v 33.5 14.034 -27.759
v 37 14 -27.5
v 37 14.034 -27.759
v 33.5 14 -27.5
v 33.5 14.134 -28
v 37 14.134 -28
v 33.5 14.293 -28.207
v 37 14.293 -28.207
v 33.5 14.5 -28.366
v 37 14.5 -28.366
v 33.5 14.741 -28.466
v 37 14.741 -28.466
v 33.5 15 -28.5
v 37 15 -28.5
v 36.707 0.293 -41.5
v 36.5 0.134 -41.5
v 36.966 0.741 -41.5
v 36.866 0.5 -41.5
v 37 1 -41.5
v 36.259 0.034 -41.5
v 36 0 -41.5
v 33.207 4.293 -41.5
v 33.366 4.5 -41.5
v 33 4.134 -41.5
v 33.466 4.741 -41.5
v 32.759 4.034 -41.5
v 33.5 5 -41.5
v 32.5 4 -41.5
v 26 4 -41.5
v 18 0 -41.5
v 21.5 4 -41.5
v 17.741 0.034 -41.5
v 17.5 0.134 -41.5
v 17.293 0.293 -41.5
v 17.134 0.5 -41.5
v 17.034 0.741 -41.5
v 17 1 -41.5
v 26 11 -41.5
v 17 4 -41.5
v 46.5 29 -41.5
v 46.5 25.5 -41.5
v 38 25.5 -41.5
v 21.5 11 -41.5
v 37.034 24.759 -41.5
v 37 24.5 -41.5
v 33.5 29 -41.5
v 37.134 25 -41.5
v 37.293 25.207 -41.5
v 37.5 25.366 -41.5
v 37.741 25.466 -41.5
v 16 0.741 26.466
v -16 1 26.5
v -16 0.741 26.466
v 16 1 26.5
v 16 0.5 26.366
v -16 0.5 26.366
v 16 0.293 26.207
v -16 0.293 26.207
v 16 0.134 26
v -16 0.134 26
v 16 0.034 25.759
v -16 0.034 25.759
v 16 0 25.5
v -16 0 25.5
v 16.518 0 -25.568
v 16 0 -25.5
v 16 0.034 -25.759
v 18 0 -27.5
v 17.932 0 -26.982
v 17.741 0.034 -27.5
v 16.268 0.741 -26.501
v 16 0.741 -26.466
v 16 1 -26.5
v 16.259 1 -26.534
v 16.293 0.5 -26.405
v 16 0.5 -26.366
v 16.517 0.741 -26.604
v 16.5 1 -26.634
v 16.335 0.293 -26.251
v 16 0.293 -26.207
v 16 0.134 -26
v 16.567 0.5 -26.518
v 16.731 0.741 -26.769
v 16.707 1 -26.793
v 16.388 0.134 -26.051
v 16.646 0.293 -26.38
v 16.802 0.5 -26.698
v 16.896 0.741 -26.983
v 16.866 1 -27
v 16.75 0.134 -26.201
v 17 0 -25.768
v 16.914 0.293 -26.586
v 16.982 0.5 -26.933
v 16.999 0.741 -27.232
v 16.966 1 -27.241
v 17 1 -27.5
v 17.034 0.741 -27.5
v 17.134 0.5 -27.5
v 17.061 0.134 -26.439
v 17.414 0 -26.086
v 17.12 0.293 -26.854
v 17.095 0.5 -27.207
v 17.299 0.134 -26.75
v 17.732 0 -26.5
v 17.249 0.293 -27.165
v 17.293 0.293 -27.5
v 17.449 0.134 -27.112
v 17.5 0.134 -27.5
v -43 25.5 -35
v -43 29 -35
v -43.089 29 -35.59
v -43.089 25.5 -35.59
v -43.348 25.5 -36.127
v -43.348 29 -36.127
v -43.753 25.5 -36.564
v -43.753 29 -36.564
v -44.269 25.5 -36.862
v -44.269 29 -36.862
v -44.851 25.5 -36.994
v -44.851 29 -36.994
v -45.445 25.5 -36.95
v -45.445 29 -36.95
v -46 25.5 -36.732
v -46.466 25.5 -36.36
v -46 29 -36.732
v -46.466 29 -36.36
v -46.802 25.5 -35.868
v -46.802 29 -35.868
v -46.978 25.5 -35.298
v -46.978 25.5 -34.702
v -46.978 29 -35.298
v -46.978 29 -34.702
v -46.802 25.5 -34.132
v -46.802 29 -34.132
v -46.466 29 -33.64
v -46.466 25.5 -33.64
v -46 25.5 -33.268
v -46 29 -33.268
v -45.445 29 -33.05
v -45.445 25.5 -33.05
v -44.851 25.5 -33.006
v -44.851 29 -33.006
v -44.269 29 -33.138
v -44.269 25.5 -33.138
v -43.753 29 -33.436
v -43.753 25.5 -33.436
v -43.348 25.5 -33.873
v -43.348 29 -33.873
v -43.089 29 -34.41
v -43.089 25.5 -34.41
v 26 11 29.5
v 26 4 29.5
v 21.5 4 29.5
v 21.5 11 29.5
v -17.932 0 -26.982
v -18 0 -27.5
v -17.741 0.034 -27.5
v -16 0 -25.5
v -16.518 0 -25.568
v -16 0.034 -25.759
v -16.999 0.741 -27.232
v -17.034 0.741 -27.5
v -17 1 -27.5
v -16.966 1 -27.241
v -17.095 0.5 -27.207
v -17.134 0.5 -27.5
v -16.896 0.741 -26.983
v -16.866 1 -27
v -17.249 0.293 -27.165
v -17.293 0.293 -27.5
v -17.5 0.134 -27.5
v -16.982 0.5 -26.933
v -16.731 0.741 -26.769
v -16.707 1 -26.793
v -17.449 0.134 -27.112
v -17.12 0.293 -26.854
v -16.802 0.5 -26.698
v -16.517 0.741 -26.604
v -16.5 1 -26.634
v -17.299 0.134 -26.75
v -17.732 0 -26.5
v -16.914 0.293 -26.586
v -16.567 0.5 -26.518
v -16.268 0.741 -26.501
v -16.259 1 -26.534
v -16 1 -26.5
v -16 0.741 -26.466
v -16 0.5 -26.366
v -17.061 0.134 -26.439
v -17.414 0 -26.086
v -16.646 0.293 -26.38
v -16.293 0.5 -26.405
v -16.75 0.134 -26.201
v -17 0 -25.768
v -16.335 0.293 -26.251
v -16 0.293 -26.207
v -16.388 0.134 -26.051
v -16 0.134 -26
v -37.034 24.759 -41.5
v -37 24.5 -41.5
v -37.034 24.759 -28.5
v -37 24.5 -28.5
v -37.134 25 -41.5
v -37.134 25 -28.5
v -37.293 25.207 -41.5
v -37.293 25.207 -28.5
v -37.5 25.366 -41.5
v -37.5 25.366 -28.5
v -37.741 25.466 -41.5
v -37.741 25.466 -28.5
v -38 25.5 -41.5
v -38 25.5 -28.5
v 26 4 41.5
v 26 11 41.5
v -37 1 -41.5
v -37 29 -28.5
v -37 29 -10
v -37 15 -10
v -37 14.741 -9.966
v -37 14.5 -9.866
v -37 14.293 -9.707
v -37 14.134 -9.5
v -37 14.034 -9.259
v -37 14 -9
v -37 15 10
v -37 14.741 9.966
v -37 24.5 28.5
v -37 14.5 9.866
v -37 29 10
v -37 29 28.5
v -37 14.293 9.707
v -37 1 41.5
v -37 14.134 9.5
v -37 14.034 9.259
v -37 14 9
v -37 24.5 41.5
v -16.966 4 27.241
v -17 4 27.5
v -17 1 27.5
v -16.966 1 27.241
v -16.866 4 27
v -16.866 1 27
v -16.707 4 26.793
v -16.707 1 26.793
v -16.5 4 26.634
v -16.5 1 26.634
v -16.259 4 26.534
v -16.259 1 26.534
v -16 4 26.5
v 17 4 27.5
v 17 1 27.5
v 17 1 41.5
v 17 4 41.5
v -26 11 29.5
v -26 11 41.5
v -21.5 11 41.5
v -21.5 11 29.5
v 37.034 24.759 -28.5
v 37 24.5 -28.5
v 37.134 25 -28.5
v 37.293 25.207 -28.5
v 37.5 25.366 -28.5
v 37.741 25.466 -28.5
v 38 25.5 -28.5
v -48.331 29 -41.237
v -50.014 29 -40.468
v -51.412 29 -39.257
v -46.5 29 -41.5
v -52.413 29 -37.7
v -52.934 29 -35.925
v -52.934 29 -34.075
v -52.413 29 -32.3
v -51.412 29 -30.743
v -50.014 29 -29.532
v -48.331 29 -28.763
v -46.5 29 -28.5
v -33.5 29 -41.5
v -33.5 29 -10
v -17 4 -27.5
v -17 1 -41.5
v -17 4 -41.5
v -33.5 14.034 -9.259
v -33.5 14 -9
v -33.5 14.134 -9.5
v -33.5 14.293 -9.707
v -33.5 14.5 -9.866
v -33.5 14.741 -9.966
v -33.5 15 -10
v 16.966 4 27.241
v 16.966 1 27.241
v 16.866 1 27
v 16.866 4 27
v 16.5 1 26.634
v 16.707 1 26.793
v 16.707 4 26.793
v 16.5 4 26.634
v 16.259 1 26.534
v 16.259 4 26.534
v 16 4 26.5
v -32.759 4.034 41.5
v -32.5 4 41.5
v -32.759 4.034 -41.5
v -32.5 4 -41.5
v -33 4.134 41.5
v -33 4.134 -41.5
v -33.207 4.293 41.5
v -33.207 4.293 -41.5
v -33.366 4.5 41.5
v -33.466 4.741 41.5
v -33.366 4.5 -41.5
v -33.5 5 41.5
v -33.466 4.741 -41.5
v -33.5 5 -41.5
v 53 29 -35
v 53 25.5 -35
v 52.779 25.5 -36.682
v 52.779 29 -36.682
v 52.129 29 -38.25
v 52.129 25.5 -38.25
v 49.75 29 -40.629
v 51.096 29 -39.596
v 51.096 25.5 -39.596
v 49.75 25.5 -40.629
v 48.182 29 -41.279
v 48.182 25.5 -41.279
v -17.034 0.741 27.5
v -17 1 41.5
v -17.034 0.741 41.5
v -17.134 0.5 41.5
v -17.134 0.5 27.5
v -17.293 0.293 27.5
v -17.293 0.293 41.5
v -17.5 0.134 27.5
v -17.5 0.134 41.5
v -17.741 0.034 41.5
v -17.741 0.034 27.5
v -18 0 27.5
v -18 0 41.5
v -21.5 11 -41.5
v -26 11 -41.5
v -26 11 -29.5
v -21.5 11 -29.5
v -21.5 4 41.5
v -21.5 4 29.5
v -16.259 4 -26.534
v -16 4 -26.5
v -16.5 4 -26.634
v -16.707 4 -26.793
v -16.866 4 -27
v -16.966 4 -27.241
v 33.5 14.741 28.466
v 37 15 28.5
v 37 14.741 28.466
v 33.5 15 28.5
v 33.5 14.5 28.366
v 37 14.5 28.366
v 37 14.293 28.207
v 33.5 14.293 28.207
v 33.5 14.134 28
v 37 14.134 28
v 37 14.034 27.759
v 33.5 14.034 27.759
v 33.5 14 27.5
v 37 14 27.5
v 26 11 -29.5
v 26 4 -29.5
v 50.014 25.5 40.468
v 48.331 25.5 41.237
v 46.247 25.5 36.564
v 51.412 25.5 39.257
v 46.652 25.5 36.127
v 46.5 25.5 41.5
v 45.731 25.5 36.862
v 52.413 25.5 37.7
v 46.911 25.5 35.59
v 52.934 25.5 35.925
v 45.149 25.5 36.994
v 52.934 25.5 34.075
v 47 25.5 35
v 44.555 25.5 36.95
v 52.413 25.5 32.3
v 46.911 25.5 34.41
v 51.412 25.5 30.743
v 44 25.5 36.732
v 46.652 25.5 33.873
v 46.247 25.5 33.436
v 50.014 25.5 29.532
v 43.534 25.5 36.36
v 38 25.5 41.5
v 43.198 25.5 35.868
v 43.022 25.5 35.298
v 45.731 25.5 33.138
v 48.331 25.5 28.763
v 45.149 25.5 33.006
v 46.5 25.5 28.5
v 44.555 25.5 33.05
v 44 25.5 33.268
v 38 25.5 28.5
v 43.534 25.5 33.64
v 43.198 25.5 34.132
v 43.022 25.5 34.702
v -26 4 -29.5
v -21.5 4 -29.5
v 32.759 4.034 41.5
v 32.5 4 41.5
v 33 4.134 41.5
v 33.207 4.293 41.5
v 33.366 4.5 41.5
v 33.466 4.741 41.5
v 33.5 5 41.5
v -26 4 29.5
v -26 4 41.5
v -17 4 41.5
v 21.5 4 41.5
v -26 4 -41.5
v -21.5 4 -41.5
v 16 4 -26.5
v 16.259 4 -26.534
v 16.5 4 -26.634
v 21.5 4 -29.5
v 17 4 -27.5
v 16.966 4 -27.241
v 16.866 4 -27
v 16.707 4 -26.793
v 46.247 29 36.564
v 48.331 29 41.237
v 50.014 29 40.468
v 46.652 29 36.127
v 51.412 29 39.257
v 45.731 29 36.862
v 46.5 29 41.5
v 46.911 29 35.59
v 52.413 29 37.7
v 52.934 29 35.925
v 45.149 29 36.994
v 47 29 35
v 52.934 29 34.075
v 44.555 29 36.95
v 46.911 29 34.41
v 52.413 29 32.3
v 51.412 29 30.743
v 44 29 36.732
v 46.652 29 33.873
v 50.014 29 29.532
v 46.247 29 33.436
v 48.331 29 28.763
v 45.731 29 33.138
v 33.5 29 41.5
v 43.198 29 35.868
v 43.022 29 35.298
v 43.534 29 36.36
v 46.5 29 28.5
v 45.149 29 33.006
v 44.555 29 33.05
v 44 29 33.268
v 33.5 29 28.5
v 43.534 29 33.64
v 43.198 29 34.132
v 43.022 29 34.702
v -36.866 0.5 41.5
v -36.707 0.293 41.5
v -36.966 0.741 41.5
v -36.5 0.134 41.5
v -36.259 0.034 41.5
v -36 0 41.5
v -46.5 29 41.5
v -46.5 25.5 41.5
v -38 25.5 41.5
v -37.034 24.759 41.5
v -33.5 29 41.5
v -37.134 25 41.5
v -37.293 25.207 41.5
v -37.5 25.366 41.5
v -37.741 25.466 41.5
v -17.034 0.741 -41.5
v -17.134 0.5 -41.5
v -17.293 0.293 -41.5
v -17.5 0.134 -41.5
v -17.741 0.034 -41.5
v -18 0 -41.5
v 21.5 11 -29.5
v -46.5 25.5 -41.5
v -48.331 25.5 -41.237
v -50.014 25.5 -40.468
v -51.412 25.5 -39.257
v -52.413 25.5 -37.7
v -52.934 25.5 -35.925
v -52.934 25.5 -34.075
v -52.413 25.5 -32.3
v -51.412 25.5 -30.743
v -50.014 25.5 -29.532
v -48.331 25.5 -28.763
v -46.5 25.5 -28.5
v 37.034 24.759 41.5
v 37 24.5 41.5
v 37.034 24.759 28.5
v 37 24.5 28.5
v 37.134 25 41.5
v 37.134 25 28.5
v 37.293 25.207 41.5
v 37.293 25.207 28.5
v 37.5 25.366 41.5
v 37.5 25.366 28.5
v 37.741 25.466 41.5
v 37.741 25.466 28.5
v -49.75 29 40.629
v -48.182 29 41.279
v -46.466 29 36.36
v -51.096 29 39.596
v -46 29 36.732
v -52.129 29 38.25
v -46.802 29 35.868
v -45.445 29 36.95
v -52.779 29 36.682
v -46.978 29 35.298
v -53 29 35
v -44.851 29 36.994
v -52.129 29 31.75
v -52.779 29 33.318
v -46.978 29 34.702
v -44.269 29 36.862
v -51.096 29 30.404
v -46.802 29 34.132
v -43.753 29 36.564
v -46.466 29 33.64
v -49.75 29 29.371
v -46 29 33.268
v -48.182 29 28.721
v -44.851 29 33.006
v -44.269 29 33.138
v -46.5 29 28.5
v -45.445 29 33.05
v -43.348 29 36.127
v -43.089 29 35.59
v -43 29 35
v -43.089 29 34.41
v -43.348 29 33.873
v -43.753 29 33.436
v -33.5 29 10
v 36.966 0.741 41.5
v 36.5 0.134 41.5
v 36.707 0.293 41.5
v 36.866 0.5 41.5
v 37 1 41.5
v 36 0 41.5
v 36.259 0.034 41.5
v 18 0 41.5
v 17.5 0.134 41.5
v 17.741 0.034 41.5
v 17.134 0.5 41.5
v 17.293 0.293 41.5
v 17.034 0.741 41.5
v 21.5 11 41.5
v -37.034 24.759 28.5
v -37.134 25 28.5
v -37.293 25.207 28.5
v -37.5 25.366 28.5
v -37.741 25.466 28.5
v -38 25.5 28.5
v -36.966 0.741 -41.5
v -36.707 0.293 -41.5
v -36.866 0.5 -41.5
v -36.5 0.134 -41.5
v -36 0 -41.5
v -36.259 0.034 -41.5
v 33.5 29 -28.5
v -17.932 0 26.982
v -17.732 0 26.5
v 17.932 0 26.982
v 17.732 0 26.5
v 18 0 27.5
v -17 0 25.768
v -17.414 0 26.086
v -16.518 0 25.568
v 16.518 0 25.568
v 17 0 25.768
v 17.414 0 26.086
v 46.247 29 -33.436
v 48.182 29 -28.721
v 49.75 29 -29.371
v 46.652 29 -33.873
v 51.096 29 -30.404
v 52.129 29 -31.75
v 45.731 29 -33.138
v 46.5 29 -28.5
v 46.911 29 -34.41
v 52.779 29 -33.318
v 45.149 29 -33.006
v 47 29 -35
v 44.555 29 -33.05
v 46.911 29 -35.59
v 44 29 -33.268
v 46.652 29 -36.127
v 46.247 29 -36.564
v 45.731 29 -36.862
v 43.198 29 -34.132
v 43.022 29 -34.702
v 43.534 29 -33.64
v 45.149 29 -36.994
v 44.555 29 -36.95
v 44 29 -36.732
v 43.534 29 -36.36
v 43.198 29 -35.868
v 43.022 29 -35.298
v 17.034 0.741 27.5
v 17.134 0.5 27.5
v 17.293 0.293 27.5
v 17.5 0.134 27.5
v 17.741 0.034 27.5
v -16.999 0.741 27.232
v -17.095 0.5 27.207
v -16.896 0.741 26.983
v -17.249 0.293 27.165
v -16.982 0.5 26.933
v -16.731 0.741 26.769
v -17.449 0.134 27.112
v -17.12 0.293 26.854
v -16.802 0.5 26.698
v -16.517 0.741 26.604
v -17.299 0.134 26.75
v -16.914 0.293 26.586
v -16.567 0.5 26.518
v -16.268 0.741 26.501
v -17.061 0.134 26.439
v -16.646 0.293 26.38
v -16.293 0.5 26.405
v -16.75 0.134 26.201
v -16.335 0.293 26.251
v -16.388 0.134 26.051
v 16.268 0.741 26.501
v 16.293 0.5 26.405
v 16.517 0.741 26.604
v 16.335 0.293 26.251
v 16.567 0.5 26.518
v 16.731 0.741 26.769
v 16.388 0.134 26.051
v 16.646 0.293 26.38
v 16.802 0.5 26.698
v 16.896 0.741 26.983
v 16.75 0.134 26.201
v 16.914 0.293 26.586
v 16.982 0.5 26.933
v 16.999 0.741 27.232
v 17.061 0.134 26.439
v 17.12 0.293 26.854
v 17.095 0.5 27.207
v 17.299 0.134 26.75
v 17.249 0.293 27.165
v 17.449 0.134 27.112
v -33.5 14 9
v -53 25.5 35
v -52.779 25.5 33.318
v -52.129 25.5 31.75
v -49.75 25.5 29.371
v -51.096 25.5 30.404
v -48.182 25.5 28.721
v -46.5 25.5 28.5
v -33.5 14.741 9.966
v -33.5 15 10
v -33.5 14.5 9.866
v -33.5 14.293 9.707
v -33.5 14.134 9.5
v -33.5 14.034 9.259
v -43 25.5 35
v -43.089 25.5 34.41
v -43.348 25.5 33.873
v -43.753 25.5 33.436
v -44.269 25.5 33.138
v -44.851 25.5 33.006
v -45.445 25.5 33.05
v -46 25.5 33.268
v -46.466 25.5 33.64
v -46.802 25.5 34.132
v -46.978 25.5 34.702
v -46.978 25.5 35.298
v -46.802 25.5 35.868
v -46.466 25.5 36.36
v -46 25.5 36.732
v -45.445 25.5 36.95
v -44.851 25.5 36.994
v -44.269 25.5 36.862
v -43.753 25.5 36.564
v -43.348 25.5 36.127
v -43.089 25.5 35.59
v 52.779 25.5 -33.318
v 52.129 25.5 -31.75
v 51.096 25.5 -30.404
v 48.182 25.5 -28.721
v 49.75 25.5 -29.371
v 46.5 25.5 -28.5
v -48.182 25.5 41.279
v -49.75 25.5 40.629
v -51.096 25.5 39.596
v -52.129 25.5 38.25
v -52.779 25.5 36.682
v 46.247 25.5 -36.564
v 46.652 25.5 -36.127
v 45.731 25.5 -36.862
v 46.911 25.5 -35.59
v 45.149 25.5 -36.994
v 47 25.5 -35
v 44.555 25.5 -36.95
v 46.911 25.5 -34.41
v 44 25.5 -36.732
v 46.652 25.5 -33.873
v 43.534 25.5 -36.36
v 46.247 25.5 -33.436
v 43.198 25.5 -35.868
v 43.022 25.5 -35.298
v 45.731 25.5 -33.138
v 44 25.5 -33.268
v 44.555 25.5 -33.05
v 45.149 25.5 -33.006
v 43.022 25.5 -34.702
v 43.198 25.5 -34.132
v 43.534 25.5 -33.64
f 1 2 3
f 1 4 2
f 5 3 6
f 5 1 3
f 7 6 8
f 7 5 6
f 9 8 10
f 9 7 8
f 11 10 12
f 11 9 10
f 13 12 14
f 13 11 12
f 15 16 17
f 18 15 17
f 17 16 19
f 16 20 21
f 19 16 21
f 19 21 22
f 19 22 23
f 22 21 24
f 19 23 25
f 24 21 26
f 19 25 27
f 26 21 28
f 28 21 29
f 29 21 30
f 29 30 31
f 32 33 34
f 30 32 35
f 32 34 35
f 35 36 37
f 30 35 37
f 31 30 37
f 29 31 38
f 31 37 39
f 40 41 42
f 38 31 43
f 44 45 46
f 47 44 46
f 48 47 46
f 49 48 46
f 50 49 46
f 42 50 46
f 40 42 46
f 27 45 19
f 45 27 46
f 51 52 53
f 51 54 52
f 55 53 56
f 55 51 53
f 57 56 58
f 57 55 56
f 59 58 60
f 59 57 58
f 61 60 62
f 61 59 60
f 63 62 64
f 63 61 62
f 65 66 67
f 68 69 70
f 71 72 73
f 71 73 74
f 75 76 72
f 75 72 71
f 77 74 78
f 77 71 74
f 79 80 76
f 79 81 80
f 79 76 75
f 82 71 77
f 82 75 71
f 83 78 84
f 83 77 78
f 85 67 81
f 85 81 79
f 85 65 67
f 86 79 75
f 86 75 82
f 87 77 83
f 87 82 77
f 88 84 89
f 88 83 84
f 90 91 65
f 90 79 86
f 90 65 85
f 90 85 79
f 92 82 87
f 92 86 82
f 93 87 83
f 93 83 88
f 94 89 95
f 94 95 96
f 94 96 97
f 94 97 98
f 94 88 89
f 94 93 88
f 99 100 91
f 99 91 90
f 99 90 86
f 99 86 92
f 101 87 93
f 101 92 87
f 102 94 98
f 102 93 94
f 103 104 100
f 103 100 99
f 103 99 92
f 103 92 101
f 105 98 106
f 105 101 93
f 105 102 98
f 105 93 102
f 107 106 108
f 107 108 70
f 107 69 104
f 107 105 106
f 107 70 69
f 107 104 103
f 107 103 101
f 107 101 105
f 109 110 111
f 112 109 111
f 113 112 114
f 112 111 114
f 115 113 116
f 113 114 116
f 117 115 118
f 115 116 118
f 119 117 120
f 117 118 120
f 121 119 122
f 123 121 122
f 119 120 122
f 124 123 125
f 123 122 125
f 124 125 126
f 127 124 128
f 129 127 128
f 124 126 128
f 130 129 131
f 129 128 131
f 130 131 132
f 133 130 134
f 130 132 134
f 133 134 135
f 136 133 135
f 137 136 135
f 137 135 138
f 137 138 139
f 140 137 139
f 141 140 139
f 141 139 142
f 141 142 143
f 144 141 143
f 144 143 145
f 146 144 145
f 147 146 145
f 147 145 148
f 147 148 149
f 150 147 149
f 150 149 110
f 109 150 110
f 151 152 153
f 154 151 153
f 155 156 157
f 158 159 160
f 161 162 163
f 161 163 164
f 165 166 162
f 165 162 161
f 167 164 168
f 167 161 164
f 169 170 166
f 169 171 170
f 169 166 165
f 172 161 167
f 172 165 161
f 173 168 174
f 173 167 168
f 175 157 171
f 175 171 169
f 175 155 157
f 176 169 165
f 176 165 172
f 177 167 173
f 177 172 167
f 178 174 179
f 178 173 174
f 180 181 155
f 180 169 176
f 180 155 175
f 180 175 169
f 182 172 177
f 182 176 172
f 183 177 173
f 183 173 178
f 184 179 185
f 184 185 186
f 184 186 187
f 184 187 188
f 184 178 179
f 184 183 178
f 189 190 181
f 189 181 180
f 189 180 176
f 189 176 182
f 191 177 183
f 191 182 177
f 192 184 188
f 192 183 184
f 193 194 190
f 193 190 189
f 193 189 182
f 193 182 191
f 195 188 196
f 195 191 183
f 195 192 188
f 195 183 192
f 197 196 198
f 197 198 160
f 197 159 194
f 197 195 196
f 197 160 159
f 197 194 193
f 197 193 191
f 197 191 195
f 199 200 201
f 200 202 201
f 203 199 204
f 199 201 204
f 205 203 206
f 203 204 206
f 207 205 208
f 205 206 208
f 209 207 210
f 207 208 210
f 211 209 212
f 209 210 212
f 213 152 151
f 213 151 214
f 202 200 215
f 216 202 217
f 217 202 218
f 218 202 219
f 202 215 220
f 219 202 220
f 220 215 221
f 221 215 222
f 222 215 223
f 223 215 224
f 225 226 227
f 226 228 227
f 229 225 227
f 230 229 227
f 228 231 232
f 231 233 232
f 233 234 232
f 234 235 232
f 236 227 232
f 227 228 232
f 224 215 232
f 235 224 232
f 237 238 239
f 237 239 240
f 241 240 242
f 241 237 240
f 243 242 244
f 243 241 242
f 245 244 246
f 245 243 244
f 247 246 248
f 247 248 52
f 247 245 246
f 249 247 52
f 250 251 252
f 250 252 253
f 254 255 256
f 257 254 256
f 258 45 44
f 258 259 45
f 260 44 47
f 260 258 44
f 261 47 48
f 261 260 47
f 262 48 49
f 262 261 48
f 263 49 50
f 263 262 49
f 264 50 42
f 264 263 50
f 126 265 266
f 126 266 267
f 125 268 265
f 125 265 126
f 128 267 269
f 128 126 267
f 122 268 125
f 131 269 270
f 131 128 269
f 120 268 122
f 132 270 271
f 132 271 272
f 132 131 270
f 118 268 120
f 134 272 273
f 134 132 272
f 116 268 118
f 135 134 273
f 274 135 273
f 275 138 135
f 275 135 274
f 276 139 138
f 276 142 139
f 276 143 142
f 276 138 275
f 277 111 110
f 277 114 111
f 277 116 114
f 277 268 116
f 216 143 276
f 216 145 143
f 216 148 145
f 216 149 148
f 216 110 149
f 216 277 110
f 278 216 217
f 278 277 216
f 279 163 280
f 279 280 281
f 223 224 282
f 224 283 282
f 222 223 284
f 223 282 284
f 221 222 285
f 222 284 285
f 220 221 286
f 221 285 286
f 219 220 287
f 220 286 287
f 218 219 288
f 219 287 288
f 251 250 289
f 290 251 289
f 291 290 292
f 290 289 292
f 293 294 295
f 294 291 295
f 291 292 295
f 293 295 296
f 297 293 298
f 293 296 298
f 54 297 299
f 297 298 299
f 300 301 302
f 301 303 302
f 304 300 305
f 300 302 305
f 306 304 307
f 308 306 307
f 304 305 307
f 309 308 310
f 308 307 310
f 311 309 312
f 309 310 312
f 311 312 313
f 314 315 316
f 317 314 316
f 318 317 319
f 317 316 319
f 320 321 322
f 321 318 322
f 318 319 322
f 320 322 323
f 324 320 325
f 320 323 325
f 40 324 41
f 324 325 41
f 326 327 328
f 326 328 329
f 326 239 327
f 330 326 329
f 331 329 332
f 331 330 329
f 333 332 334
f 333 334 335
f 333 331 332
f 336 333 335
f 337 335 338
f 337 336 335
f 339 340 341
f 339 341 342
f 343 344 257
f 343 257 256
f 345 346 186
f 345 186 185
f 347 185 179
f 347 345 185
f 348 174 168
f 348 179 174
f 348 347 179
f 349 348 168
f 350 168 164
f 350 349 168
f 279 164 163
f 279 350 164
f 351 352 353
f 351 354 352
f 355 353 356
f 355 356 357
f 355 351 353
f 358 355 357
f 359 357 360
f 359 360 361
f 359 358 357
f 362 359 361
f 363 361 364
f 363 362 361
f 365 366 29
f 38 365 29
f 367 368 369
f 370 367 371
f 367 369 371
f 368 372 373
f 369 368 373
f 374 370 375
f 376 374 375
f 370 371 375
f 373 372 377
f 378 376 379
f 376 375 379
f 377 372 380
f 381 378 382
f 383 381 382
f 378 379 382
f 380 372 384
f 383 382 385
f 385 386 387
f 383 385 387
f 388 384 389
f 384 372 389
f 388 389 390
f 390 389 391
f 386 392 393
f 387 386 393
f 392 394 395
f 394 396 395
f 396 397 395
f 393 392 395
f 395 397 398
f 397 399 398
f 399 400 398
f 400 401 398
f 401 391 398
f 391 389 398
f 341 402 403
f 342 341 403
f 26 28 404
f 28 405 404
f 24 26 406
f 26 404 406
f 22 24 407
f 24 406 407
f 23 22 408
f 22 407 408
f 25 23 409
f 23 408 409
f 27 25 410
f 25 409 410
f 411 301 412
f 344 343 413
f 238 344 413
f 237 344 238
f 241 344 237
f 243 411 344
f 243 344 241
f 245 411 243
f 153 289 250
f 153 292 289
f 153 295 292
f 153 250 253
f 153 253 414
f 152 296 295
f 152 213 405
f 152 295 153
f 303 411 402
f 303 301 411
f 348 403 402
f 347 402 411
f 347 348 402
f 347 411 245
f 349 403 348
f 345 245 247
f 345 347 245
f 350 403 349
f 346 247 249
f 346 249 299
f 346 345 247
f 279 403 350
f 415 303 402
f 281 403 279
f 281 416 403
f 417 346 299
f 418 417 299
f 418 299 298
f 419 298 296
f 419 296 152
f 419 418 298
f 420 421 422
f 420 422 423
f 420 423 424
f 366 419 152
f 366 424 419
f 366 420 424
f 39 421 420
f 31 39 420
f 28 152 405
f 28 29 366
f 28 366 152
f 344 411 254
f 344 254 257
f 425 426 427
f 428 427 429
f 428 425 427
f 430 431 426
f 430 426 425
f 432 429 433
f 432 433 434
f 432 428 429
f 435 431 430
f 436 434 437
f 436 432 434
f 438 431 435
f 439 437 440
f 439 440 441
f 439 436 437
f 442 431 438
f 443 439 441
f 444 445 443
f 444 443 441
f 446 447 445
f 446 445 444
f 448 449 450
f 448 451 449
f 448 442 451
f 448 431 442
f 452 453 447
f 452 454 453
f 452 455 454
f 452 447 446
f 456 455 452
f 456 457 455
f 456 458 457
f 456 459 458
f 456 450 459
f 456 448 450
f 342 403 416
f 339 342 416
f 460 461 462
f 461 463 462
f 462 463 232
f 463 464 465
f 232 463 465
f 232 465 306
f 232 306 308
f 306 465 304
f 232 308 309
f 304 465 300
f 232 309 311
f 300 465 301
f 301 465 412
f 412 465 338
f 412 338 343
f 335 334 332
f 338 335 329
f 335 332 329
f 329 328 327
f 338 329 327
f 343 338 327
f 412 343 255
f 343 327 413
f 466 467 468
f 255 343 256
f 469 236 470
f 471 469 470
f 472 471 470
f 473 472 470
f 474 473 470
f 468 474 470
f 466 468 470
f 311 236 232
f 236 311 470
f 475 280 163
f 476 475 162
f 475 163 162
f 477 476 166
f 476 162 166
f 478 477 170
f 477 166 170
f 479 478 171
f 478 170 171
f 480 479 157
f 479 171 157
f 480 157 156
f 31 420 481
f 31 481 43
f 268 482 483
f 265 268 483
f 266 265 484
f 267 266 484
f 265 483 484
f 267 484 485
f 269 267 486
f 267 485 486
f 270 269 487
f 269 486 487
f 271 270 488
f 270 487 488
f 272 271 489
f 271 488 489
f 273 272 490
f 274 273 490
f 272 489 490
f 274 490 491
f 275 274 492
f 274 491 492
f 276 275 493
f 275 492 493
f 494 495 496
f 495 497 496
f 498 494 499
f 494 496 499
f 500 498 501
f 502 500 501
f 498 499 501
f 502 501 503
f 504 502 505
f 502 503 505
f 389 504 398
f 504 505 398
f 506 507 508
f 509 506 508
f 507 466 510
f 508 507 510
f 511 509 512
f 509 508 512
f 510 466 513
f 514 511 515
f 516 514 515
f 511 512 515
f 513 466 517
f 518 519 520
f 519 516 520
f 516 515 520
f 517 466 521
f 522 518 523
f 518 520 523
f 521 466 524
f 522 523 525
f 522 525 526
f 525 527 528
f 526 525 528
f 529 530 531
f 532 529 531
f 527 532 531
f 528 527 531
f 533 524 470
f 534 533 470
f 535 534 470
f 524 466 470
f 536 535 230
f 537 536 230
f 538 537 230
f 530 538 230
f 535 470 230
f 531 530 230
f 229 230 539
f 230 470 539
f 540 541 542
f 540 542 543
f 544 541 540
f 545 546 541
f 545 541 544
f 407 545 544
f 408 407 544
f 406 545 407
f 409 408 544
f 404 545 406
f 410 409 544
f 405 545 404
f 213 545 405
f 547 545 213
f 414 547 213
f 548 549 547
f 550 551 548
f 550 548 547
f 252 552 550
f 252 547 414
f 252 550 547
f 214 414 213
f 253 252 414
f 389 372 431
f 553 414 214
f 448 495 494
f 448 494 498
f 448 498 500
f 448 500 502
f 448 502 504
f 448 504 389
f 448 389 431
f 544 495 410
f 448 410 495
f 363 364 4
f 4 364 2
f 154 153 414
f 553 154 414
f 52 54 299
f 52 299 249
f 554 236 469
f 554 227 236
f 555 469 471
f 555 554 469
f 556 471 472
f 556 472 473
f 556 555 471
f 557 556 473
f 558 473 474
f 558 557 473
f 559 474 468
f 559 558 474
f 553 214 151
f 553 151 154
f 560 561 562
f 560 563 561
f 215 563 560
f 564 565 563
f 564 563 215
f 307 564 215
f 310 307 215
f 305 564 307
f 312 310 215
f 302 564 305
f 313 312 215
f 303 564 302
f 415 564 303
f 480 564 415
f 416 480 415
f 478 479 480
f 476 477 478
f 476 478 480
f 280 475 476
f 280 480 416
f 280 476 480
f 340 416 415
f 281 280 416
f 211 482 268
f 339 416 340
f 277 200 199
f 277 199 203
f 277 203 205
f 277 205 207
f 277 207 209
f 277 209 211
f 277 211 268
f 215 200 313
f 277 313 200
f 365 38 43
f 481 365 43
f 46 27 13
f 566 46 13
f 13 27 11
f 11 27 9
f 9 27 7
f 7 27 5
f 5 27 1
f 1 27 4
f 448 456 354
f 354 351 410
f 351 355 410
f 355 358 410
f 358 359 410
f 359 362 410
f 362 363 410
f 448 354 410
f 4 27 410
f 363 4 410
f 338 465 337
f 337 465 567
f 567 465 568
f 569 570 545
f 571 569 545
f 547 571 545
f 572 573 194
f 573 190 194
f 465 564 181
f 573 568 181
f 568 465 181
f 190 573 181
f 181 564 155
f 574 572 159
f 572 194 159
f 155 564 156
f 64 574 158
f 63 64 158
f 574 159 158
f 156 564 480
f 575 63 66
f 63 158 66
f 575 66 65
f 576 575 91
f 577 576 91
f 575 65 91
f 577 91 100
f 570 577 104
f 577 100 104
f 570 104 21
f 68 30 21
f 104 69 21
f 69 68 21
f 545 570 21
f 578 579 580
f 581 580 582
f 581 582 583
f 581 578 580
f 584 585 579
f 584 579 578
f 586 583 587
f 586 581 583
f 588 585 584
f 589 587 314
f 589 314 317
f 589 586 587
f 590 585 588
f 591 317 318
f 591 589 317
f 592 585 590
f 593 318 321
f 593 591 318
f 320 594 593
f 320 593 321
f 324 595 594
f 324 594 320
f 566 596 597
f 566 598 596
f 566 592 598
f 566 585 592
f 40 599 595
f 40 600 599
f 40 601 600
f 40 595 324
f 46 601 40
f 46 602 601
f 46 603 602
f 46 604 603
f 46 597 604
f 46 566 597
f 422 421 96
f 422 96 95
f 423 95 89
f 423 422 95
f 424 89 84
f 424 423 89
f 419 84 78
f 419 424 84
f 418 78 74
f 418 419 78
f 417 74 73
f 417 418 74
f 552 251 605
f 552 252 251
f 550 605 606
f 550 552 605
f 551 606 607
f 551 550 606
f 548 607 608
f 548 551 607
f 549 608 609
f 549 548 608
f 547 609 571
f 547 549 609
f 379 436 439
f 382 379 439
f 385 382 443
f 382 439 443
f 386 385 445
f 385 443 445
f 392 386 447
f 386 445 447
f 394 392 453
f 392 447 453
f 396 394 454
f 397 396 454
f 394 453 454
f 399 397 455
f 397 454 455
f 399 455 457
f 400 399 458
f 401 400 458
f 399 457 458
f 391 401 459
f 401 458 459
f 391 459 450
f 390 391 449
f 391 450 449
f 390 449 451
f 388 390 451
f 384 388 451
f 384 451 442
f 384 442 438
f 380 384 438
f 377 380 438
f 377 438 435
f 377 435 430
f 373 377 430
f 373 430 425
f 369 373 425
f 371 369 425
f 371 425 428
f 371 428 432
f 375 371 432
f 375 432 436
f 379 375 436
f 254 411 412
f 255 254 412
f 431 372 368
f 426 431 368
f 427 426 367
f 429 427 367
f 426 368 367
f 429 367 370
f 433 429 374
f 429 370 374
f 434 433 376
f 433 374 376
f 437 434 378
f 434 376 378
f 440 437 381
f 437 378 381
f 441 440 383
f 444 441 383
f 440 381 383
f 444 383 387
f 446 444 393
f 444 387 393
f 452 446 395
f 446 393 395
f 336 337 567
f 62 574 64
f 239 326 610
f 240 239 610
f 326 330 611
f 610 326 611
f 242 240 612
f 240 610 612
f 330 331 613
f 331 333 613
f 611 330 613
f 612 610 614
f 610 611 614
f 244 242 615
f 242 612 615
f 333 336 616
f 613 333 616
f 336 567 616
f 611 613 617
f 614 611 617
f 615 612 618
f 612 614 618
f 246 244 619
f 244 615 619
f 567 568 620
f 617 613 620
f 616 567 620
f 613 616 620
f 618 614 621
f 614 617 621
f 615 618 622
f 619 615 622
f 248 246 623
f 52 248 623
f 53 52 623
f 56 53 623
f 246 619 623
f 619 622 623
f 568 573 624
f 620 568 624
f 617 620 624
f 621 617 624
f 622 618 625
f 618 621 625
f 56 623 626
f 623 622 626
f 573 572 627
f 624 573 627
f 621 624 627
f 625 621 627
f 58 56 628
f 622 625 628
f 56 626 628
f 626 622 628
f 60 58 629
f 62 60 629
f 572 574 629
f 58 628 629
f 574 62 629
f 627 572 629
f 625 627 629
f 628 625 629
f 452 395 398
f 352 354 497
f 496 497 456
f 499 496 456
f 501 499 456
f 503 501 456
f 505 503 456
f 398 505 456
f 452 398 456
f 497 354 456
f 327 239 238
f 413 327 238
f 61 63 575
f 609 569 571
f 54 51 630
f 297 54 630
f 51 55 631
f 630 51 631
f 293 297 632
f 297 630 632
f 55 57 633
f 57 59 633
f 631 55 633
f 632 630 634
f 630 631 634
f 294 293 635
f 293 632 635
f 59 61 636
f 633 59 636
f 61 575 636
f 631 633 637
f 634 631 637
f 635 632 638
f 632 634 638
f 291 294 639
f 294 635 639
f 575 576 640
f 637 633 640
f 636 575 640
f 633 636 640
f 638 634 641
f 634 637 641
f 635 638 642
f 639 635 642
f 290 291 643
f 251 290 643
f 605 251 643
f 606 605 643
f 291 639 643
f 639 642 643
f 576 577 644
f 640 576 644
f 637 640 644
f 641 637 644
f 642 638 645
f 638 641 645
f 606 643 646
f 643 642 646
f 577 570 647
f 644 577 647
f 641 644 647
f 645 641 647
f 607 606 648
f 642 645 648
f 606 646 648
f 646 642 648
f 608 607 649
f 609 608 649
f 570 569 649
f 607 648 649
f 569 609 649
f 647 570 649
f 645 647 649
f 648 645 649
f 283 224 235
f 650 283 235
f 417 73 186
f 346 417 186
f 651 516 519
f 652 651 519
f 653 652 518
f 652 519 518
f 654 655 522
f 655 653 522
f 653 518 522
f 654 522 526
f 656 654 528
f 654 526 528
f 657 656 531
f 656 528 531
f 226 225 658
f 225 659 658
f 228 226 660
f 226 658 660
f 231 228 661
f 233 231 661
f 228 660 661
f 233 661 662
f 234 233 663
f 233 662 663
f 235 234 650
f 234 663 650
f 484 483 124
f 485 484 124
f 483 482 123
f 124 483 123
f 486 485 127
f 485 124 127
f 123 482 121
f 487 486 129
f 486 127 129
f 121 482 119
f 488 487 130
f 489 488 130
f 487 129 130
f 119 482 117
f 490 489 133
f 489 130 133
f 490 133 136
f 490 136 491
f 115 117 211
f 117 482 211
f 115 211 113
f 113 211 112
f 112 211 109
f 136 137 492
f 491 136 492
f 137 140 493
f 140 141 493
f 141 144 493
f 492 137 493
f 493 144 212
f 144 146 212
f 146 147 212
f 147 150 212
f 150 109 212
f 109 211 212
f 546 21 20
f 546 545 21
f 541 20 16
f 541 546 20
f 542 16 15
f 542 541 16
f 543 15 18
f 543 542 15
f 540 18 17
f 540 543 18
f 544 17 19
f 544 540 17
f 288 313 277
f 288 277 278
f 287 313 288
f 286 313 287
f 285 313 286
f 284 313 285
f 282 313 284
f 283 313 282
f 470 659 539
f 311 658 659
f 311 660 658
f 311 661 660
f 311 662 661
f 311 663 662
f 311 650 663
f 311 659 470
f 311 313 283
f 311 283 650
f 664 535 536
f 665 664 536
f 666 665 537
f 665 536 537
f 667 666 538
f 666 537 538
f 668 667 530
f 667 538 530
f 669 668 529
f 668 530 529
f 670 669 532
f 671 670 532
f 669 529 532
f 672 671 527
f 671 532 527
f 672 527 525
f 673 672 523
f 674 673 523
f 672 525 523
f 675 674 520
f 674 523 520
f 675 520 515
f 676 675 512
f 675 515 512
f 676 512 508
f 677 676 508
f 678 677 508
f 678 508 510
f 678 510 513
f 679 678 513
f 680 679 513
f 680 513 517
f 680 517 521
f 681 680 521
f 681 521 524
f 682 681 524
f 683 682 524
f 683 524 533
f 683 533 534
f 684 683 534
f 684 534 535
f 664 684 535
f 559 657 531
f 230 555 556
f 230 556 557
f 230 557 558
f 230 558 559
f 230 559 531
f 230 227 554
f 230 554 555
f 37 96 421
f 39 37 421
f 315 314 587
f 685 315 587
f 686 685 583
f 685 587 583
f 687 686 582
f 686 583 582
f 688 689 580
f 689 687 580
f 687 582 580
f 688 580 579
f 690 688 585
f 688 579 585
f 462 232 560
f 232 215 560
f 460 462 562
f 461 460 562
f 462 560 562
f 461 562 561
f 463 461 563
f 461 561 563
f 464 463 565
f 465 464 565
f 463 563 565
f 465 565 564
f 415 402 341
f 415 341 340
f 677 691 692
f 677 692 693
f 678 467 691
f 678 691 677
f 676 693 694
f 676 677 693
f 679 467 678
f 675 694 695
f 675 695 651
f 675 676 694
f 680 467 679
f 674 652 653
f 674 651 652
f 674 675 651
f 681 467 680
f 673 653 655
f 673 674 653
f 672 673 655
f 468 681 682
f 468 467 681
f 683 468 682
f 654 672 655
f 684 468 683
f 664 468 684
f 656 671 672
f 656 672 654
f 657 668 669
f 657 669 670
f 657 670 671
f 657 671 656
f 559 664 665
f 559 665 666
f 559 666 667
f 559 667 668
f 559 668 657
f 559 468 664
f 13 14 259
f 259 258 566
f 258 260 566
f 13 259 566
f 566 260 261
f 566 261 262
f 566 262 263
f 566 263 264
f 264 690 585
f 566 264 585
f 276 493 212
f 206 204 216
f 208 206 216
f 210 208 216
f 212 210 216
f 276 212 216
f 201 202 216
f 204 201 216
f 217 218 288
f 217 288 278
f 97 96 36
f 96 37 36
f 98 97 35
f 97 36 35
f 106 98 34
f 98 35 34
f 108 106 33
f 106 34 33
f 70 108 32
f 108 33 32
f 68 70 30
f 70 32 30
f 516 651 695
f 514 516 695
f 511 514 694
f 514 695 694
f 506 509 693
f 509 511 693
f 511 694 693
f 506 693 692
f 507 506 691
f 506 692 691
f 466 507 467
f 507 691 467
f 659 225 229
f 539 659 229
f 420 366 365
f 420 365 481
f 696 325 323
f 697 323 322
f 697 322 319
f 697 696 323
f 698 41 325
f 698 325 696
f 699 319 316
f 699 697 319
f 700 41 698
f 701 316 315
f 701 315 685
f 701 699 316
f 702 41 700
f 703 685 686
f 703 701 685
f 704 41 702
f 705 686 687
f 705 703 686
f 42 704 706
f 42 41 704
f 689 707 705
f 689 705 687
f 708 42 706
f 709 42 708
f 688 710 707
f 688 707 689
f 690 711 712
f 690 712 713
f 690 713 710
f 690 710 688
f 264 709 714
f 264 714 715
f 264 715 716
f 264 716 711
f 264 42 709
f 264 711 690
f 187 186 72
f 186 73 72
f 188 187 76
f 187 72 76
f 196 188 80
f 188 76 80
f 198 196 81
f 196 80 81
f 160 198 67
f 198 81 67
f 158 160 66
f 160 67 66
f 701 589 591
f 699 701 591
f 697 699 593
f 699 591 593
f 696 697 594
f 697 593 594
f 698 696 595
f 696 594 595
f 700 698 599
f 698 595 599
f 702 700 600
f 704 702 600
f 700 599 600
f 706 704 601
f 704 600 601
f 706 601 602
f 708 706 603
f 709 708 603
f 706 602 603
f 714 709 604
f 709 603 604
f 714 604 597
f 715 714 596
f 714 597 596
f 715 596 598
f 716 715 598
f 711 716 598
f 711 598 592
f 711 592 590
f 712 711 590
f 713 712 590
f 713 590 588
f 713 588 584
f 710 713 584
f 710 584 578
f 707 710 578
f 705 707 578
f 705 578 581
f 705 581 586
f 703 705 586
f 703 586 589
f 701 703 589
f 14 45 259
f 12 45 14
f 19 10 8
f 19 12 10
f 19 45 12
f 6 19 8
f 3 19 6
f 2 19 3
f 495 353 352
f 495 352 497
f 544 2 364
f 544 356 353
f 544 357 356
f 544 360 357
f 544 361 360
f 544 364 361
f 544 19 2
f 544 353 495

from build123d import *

# Parameters (mm, degrees)
SKETCH1_W                       = 74
SKETCH1_H                       = 53
BOSS_EXTRUDE1_DEPTH             = 4
SKETCH2_W                       = 3.5
SKETCH2_H                       = 53
BOSS_EXTRUDE2_DEPTH             = 25
CUT_EXTRUDE1_REACH              = 85.781
SKETCH3_W                       = 20
SKETCH3_H                       = 15
SKETCH5_W                       = 20
SKETCH5_H                       = 4
BOSS_EXTRUDE4_DEPTH             = 15
MIRROR4_COPY_1_SKETCH_W         = 20
MIRROR4_COPY_1_SKETCH_H         = 4
MIRROR4_COPY_1_DEPTH            = 15
SKETCH6_W                       = 3.5
SKETCH6_H                       = 15
BOSS_EXTRUDE5_DEPTH             = 25
MIRROR6_COPY_1_SKETCH_W         = 3.5
MIRROR6_COPY_1_SKETCH_H         = 15
MIRROR6_COPY_1_DEPTH            = 25
SKETCH7_W                       = 4.5
SKETCH7_H                       = 12
BOSS_EXTRUDE6_DEPTH             = 7
MIRROR8_COPY_1_SKETCH_W         = 4.5
MIRROR8_COPY_1_SKETCH_H         = 12
MIRROR8_COPY_1_DEPTH            = 7
SKETCH8_W                       = 13
SKETCH8_H                       = 3.5
BOSS_EXTRUDE7_DEPTH             = 16
MIRROR10_COPY_1_SKETCH_W        = 13
MIRROR10_COPY_1_SKETCH_H        = 3.5
MIRROR10_COPY_1_DEPTH           = 16
CUT_EXTRUDE2_REACH              = 105.263
SKETCH9_W                       = 57
SKETCH9_H                       = 15
F_4_0MM_CLEARANCE_DOWEL_HOLE1_D = 4
FILLET1_R                       = 6.5
FILLET2_R                       = 1
FILLET3_R                       = 1


with BuildPart() as part:
    # Sketch1 → Boss-Extrude1 (new body)
    with BuildSketch(Plane(origin=(0, 0, 0), x_dir=(1, 0, 0), z_dir=(0, 1, 0))):
        Rectangle(SKETCH1_W, SKETCH1_H)
    extrude(amount=BOSS_EXTRUDE1_DEPTH)

    # Sketch2 → Boss-Extrude2 (add)
    with BuildSketch(Plane(origin=(0, 4, 0), x_dir=(1, 0, 0), z_dir=(0, 1, 0))):
        with Locations((-35.25, 0)):
            Rectangle(SKETCH2_W, SKETCH2_H)
    boss_extrude2 = extrude(amount=BOSS_EXTRUDE2_DEPTH)

    # Mirror1: Boss-Extrude2 across plane
    add(boss_extrude2.mirror(Plane(origin=(0, 0, 0), x_dir=(0, 0, 1), z_dir=(1, 0, 0))))

    # Sketch3 → Cut-Extrude1 (cut, up to next)
    with BuildSketch(Plane.ZY.offset(37), mode=Mode.PRIVATE) as cut_extrude1_sk1:
        with Locations((0, 21.5)):
            Rectangle(SKETCH3_W, SKETCH3_H)
    cut_extrude1_tool1 = extrude(cut_extrude1_sk1.sketch, amount=-CUT_EXTRUDE1_REACH, mode=Mode.PRIVATE) & part.part
    add(cut_extrude1_tool1.solids().sort_by_distance((-37, 21.5, 0))[0], mode=Mode.SUBTRACT)

    # Sketch5 → Boss-Extrude4 (add)
    with BuildSketch(Plane(origin=(0, 0, -26.5), x_dir=(-1, 0, 0), z_dir=(0, 0, -1))):
        with Locations((27, 2)):
            Rectangle(SKETCH5_W, SKETCH5_H)
    boss_extrude4 = extrude(amount=BOSS_EXTRUDE4_DEPTH)

    # Mirror3: Boss-Extrude4 across plane
    add(boss_extrude4.mirror(Plane.XY))

    # Mirror4: Boss-Extrude4 across plane
    add(boss_extrude4.mirror(Plane(origin=(0, 0, 0), x_dir=(0, 0, 1), z_dir=(1, 0, 0))))

    # Mirror4 copy 1 sketch → Mirror4 copy 1 (add)
    with BuildSketch(Plane.XY.offset(26.5)):
        with Locations((27, 2)):
            Rectangle(MIRROR4_COPY_1_SKETCH_W, MIRROR4_COPY_1_SKETCH_H)
    extrude(amount=MIRROR4_COPY_1_DEPTH)

    # Sketch6 → Boss-Extrude5 (add)
    with BuildSketch(Plane(origin=(0, 4, 0), x_dir=(1, 0, 0), z_dir=(0, 1, 0))):
        with Locations((-35.25, 34)):
            Rectangle(SKETCH6_W, SKETCH6_H)
    boss_extrude5 = extrude(amount=BOSS_EXTRUDE5_DEPTH)

    # Mirror5: Boss-Extrude5 across plane
    add(boss_extrude5.mirror(Plane.XY))

    # Mirror6: Boss-Extrude5 across plane
    add(boss_extrude5.mirror(Plane(origin=(0, 0, 0), x_dir=(0, 0, 1), z_dir=(1, 0, 0))))

    # Mirror6 copy 1 sketch → Mirror6 copy 1 (add)
    with BuildSketch(Plane(origin=(0, 4, 0), x_dir=(-1, 0, 0), z_dir=(0, 1, 0))):
        with Locations((-35.25, 34)):
            Rectangle(MIRROR6_COPY_1_SKETCH_W, MIRROR6_COPY_1_SKETCH_H)
    extrude(amount=MIRROR6_COPY_1_DEPTH)

    # Sketch7 → Boss-Extrude6 (add)
    with BuildSketch(Plane(origin=(0, 4, 0), x_dir=(1, 0, 0), z_dir=(0, 1, 0))):
        with Locations((-23.75, 35.5)):
            Rectangle(SKETCH7_W, SKETCH7_H)
    boss_extrude6 = extrude(amount=BOSS_EXTRUDE6_DEPTH)

    # Mirror7: Boss-Extrude6 across plane
    add(boss_extrude6.mirror(Plane.XY))

    # Mirror8: Boss-Extrude6 across plane
    add(boss_extrude6.mirror(Plane(origin=(0, 0, 0), x_dir=(0, 0, 1), z_dir=(1, 0, 0))))

    # Mirror8 copy 1 sketch → Mirror8 copy 1 (add)
    with BuildSketch(Plane(origin=(0, 4, 0), x_dir=(-1, 0, 0), z_dir=(0, 1, 0))):
        with Locations((-23.75, 35.5)):
            Rectangle(MIRROR8_COPY_1_SKETCH_W, MIRROR8_COPY_1_SKETCH_H)
    extrude(amount=MIRROR8_COPY_1_DEPTH)

    # Sketch8 → Boss-Extrude7 (add)
    with BuildSketch(Plane.ZY.offset(37)):
        with Locations((-35, 27.25)):
            Rectangle(SKETCH8_W, SKETCH8_H)
    boss_extrude7 = extrude(amount=BOSS_EXTRUDE7_DEPTH)

    # Mirror9: Boss-Extrude7 across plane
    add(boss_extrude7.mirror(Plane.XY))

    # Mirror10: Boss-Extrude7 across plane
    add(boss_extrude7.mirror(Plane(origin=(0, 0, 0), x_dir=(0, 0, 1), z_dir=(1, 0, 0))))

    # Mirror10 copy 1 sketch → Mirror10 copy 1 (add)
    with BuildSketch(Plane(origin=(37, 0, 0), x_dir=(0, 0, -1), z_dir=(1, 0, 0))):
        with Locations((-35, 27.25)):
            Rectangle(MIRROR10_COPY_1_SKETCH_W, MIRROR10_COPY_1_SKETCH_H)
    extrude(amount=MIRROR10_COPY_1_DEPTH)

    # Sketch9 → Cut-Extrude2 (cut, up to next)
    with BuildSketch(Plane(origin=(37, 0, 0), x_dir=(0, 0, -1), z_dir=(1, 0, 0)), mode=Mode.PRIVATE) as cut_extrude2_sk1:
        with Locations((0, 21.5)):
            Rectangle(SKETCH9_W, SKETCH9_H)
    cut_extrude2_tool1 = extrude(cut_extrude2_sk1.sketch, amount=-CUT_EXTRUDE2_REACH, mode=Mode.PRIVATE) & part.part
    add(cut_extrude2_tool1.solids().sort_by_distance((37, 21.5, 0))[0], mode=Mode.SUBTRACT)

    # Ø4.0mm Clearance Dowel Hole1 (through all)
    with Locations(Plane(origin=(0, 25.5, 0), x_dir=(-1, 0, 0), z_dir=(0, -1, 0))):
        with Locations((-45, 35), (-45, -35), (45, 35), (45, -35)):
            Hole(F_4_0MM_CLEARANCE_DOWEL_HOLE1_D / 2)

    # Fillet1
    # the kernel refuses this fillet: 6.5 mm, written as the material it takes off along each edge
    with BuildSketch(Plane(origin=(53, 45.25, -28.5), x_dir=(0, 0, -1), z_dir=(0, -1, 0)), Plane(origin=(53, 45.25, 28.5), x_dir=(-1, 0, 0), z_dir=(0, -1, 0)), Plane(origin=(53, 9.25, 41.5), x_dir=(-1, 0, 0), z_dir=(0, 1, 0)), Plane(origin=(-53, 9.25, -41.5), x_dir=(1, 0, 0), z_dir=(0, 1, 0)), Plane(origin=(-53, 45.25, -28.5), x_dir=(1, 0, 0), z_dir=(0, -1, 0))) as fillet1_piece_1:
        with BuildLine():
            CenterArc((FILLET1_R, -FILLET1_R), FILLET1_R, 90, 90)
            Line((0, -FILLET1_R), (0, 0))
            Line((0, 0), (FILLET1_R, 0))
        make_face()
    extrude(amount=36, mode=Mode.SUBTRACT)
    with BuildSketch(Plane(origin=(53, 9.25, -41.5), x_dir=(-1, 0, 0), z_dir=(0, 1, 0)), Plane(origin=(-53, 45.25, 28.5), x_dir=(1, 0, 0), z_dir=(0, -1, 0)), Plane(origin=(-53, 9.25, 41.5), x_dir=(1, 0, 0), z_dir=(0, 1, 0))) as fillet1_piece_2:
        with BuildLine():
            CenterArc((FILLET1_R, FILLET1_R), FILLET1_R, 180, 90)
            Line((0, FILLET1_R), (0, 0))
            Line((0, 0), (FILLET1_R, 0))
        make_face()
    extrude(amount=36, mode=Mode.SUBTRACT)

    # Fillet2
    fillet2_edges = [part.edges().sort_by_distance(p)[0] for p in [
        (-33.5, 4, 0),
        (-37, 25.5, -35),
        (-37, 25.5, 35),
        (37, 25.5, 35),
        (37, 25.5, -35),
        (35.25, 14, 28.5),
        (35.25, 14, -28.5),
        (33.5, 4, 0),
        (-35.25, 14, -10),
        (-35.25, 14, 10),
        (-17, 2, -26.5),
        (-17, 2, 26.5),
        (17, 2, 26.5),
        (17, 2, -26.5),
    ]]
    fillet(fillet2_edges, radius=FILLET2_R)

    # Fillet3
    fillet3_edges = [part.edges().sort_by_distance(p)[0] for p in [
        (0, 0, -26.5),
        (0, 0, 26.5),
        (16.707106781, 0, -26.792893219),
        (-16.707106781, 0, -26.792893219),
        (-16.707106781, 0, 26.792893219),
        (16.707106781, 0, 26.792893219),
        (-37, 0, 0),
        (37, 0, 0),
        (-17, 0, -34.5),
        (-17, 0, 34.5),
        (17, 0, 34.5),
        (17, 0, -34.5),
    ]]
    fillet(fillet3_edges, radius=FILLET3_R)


solid = part.part
